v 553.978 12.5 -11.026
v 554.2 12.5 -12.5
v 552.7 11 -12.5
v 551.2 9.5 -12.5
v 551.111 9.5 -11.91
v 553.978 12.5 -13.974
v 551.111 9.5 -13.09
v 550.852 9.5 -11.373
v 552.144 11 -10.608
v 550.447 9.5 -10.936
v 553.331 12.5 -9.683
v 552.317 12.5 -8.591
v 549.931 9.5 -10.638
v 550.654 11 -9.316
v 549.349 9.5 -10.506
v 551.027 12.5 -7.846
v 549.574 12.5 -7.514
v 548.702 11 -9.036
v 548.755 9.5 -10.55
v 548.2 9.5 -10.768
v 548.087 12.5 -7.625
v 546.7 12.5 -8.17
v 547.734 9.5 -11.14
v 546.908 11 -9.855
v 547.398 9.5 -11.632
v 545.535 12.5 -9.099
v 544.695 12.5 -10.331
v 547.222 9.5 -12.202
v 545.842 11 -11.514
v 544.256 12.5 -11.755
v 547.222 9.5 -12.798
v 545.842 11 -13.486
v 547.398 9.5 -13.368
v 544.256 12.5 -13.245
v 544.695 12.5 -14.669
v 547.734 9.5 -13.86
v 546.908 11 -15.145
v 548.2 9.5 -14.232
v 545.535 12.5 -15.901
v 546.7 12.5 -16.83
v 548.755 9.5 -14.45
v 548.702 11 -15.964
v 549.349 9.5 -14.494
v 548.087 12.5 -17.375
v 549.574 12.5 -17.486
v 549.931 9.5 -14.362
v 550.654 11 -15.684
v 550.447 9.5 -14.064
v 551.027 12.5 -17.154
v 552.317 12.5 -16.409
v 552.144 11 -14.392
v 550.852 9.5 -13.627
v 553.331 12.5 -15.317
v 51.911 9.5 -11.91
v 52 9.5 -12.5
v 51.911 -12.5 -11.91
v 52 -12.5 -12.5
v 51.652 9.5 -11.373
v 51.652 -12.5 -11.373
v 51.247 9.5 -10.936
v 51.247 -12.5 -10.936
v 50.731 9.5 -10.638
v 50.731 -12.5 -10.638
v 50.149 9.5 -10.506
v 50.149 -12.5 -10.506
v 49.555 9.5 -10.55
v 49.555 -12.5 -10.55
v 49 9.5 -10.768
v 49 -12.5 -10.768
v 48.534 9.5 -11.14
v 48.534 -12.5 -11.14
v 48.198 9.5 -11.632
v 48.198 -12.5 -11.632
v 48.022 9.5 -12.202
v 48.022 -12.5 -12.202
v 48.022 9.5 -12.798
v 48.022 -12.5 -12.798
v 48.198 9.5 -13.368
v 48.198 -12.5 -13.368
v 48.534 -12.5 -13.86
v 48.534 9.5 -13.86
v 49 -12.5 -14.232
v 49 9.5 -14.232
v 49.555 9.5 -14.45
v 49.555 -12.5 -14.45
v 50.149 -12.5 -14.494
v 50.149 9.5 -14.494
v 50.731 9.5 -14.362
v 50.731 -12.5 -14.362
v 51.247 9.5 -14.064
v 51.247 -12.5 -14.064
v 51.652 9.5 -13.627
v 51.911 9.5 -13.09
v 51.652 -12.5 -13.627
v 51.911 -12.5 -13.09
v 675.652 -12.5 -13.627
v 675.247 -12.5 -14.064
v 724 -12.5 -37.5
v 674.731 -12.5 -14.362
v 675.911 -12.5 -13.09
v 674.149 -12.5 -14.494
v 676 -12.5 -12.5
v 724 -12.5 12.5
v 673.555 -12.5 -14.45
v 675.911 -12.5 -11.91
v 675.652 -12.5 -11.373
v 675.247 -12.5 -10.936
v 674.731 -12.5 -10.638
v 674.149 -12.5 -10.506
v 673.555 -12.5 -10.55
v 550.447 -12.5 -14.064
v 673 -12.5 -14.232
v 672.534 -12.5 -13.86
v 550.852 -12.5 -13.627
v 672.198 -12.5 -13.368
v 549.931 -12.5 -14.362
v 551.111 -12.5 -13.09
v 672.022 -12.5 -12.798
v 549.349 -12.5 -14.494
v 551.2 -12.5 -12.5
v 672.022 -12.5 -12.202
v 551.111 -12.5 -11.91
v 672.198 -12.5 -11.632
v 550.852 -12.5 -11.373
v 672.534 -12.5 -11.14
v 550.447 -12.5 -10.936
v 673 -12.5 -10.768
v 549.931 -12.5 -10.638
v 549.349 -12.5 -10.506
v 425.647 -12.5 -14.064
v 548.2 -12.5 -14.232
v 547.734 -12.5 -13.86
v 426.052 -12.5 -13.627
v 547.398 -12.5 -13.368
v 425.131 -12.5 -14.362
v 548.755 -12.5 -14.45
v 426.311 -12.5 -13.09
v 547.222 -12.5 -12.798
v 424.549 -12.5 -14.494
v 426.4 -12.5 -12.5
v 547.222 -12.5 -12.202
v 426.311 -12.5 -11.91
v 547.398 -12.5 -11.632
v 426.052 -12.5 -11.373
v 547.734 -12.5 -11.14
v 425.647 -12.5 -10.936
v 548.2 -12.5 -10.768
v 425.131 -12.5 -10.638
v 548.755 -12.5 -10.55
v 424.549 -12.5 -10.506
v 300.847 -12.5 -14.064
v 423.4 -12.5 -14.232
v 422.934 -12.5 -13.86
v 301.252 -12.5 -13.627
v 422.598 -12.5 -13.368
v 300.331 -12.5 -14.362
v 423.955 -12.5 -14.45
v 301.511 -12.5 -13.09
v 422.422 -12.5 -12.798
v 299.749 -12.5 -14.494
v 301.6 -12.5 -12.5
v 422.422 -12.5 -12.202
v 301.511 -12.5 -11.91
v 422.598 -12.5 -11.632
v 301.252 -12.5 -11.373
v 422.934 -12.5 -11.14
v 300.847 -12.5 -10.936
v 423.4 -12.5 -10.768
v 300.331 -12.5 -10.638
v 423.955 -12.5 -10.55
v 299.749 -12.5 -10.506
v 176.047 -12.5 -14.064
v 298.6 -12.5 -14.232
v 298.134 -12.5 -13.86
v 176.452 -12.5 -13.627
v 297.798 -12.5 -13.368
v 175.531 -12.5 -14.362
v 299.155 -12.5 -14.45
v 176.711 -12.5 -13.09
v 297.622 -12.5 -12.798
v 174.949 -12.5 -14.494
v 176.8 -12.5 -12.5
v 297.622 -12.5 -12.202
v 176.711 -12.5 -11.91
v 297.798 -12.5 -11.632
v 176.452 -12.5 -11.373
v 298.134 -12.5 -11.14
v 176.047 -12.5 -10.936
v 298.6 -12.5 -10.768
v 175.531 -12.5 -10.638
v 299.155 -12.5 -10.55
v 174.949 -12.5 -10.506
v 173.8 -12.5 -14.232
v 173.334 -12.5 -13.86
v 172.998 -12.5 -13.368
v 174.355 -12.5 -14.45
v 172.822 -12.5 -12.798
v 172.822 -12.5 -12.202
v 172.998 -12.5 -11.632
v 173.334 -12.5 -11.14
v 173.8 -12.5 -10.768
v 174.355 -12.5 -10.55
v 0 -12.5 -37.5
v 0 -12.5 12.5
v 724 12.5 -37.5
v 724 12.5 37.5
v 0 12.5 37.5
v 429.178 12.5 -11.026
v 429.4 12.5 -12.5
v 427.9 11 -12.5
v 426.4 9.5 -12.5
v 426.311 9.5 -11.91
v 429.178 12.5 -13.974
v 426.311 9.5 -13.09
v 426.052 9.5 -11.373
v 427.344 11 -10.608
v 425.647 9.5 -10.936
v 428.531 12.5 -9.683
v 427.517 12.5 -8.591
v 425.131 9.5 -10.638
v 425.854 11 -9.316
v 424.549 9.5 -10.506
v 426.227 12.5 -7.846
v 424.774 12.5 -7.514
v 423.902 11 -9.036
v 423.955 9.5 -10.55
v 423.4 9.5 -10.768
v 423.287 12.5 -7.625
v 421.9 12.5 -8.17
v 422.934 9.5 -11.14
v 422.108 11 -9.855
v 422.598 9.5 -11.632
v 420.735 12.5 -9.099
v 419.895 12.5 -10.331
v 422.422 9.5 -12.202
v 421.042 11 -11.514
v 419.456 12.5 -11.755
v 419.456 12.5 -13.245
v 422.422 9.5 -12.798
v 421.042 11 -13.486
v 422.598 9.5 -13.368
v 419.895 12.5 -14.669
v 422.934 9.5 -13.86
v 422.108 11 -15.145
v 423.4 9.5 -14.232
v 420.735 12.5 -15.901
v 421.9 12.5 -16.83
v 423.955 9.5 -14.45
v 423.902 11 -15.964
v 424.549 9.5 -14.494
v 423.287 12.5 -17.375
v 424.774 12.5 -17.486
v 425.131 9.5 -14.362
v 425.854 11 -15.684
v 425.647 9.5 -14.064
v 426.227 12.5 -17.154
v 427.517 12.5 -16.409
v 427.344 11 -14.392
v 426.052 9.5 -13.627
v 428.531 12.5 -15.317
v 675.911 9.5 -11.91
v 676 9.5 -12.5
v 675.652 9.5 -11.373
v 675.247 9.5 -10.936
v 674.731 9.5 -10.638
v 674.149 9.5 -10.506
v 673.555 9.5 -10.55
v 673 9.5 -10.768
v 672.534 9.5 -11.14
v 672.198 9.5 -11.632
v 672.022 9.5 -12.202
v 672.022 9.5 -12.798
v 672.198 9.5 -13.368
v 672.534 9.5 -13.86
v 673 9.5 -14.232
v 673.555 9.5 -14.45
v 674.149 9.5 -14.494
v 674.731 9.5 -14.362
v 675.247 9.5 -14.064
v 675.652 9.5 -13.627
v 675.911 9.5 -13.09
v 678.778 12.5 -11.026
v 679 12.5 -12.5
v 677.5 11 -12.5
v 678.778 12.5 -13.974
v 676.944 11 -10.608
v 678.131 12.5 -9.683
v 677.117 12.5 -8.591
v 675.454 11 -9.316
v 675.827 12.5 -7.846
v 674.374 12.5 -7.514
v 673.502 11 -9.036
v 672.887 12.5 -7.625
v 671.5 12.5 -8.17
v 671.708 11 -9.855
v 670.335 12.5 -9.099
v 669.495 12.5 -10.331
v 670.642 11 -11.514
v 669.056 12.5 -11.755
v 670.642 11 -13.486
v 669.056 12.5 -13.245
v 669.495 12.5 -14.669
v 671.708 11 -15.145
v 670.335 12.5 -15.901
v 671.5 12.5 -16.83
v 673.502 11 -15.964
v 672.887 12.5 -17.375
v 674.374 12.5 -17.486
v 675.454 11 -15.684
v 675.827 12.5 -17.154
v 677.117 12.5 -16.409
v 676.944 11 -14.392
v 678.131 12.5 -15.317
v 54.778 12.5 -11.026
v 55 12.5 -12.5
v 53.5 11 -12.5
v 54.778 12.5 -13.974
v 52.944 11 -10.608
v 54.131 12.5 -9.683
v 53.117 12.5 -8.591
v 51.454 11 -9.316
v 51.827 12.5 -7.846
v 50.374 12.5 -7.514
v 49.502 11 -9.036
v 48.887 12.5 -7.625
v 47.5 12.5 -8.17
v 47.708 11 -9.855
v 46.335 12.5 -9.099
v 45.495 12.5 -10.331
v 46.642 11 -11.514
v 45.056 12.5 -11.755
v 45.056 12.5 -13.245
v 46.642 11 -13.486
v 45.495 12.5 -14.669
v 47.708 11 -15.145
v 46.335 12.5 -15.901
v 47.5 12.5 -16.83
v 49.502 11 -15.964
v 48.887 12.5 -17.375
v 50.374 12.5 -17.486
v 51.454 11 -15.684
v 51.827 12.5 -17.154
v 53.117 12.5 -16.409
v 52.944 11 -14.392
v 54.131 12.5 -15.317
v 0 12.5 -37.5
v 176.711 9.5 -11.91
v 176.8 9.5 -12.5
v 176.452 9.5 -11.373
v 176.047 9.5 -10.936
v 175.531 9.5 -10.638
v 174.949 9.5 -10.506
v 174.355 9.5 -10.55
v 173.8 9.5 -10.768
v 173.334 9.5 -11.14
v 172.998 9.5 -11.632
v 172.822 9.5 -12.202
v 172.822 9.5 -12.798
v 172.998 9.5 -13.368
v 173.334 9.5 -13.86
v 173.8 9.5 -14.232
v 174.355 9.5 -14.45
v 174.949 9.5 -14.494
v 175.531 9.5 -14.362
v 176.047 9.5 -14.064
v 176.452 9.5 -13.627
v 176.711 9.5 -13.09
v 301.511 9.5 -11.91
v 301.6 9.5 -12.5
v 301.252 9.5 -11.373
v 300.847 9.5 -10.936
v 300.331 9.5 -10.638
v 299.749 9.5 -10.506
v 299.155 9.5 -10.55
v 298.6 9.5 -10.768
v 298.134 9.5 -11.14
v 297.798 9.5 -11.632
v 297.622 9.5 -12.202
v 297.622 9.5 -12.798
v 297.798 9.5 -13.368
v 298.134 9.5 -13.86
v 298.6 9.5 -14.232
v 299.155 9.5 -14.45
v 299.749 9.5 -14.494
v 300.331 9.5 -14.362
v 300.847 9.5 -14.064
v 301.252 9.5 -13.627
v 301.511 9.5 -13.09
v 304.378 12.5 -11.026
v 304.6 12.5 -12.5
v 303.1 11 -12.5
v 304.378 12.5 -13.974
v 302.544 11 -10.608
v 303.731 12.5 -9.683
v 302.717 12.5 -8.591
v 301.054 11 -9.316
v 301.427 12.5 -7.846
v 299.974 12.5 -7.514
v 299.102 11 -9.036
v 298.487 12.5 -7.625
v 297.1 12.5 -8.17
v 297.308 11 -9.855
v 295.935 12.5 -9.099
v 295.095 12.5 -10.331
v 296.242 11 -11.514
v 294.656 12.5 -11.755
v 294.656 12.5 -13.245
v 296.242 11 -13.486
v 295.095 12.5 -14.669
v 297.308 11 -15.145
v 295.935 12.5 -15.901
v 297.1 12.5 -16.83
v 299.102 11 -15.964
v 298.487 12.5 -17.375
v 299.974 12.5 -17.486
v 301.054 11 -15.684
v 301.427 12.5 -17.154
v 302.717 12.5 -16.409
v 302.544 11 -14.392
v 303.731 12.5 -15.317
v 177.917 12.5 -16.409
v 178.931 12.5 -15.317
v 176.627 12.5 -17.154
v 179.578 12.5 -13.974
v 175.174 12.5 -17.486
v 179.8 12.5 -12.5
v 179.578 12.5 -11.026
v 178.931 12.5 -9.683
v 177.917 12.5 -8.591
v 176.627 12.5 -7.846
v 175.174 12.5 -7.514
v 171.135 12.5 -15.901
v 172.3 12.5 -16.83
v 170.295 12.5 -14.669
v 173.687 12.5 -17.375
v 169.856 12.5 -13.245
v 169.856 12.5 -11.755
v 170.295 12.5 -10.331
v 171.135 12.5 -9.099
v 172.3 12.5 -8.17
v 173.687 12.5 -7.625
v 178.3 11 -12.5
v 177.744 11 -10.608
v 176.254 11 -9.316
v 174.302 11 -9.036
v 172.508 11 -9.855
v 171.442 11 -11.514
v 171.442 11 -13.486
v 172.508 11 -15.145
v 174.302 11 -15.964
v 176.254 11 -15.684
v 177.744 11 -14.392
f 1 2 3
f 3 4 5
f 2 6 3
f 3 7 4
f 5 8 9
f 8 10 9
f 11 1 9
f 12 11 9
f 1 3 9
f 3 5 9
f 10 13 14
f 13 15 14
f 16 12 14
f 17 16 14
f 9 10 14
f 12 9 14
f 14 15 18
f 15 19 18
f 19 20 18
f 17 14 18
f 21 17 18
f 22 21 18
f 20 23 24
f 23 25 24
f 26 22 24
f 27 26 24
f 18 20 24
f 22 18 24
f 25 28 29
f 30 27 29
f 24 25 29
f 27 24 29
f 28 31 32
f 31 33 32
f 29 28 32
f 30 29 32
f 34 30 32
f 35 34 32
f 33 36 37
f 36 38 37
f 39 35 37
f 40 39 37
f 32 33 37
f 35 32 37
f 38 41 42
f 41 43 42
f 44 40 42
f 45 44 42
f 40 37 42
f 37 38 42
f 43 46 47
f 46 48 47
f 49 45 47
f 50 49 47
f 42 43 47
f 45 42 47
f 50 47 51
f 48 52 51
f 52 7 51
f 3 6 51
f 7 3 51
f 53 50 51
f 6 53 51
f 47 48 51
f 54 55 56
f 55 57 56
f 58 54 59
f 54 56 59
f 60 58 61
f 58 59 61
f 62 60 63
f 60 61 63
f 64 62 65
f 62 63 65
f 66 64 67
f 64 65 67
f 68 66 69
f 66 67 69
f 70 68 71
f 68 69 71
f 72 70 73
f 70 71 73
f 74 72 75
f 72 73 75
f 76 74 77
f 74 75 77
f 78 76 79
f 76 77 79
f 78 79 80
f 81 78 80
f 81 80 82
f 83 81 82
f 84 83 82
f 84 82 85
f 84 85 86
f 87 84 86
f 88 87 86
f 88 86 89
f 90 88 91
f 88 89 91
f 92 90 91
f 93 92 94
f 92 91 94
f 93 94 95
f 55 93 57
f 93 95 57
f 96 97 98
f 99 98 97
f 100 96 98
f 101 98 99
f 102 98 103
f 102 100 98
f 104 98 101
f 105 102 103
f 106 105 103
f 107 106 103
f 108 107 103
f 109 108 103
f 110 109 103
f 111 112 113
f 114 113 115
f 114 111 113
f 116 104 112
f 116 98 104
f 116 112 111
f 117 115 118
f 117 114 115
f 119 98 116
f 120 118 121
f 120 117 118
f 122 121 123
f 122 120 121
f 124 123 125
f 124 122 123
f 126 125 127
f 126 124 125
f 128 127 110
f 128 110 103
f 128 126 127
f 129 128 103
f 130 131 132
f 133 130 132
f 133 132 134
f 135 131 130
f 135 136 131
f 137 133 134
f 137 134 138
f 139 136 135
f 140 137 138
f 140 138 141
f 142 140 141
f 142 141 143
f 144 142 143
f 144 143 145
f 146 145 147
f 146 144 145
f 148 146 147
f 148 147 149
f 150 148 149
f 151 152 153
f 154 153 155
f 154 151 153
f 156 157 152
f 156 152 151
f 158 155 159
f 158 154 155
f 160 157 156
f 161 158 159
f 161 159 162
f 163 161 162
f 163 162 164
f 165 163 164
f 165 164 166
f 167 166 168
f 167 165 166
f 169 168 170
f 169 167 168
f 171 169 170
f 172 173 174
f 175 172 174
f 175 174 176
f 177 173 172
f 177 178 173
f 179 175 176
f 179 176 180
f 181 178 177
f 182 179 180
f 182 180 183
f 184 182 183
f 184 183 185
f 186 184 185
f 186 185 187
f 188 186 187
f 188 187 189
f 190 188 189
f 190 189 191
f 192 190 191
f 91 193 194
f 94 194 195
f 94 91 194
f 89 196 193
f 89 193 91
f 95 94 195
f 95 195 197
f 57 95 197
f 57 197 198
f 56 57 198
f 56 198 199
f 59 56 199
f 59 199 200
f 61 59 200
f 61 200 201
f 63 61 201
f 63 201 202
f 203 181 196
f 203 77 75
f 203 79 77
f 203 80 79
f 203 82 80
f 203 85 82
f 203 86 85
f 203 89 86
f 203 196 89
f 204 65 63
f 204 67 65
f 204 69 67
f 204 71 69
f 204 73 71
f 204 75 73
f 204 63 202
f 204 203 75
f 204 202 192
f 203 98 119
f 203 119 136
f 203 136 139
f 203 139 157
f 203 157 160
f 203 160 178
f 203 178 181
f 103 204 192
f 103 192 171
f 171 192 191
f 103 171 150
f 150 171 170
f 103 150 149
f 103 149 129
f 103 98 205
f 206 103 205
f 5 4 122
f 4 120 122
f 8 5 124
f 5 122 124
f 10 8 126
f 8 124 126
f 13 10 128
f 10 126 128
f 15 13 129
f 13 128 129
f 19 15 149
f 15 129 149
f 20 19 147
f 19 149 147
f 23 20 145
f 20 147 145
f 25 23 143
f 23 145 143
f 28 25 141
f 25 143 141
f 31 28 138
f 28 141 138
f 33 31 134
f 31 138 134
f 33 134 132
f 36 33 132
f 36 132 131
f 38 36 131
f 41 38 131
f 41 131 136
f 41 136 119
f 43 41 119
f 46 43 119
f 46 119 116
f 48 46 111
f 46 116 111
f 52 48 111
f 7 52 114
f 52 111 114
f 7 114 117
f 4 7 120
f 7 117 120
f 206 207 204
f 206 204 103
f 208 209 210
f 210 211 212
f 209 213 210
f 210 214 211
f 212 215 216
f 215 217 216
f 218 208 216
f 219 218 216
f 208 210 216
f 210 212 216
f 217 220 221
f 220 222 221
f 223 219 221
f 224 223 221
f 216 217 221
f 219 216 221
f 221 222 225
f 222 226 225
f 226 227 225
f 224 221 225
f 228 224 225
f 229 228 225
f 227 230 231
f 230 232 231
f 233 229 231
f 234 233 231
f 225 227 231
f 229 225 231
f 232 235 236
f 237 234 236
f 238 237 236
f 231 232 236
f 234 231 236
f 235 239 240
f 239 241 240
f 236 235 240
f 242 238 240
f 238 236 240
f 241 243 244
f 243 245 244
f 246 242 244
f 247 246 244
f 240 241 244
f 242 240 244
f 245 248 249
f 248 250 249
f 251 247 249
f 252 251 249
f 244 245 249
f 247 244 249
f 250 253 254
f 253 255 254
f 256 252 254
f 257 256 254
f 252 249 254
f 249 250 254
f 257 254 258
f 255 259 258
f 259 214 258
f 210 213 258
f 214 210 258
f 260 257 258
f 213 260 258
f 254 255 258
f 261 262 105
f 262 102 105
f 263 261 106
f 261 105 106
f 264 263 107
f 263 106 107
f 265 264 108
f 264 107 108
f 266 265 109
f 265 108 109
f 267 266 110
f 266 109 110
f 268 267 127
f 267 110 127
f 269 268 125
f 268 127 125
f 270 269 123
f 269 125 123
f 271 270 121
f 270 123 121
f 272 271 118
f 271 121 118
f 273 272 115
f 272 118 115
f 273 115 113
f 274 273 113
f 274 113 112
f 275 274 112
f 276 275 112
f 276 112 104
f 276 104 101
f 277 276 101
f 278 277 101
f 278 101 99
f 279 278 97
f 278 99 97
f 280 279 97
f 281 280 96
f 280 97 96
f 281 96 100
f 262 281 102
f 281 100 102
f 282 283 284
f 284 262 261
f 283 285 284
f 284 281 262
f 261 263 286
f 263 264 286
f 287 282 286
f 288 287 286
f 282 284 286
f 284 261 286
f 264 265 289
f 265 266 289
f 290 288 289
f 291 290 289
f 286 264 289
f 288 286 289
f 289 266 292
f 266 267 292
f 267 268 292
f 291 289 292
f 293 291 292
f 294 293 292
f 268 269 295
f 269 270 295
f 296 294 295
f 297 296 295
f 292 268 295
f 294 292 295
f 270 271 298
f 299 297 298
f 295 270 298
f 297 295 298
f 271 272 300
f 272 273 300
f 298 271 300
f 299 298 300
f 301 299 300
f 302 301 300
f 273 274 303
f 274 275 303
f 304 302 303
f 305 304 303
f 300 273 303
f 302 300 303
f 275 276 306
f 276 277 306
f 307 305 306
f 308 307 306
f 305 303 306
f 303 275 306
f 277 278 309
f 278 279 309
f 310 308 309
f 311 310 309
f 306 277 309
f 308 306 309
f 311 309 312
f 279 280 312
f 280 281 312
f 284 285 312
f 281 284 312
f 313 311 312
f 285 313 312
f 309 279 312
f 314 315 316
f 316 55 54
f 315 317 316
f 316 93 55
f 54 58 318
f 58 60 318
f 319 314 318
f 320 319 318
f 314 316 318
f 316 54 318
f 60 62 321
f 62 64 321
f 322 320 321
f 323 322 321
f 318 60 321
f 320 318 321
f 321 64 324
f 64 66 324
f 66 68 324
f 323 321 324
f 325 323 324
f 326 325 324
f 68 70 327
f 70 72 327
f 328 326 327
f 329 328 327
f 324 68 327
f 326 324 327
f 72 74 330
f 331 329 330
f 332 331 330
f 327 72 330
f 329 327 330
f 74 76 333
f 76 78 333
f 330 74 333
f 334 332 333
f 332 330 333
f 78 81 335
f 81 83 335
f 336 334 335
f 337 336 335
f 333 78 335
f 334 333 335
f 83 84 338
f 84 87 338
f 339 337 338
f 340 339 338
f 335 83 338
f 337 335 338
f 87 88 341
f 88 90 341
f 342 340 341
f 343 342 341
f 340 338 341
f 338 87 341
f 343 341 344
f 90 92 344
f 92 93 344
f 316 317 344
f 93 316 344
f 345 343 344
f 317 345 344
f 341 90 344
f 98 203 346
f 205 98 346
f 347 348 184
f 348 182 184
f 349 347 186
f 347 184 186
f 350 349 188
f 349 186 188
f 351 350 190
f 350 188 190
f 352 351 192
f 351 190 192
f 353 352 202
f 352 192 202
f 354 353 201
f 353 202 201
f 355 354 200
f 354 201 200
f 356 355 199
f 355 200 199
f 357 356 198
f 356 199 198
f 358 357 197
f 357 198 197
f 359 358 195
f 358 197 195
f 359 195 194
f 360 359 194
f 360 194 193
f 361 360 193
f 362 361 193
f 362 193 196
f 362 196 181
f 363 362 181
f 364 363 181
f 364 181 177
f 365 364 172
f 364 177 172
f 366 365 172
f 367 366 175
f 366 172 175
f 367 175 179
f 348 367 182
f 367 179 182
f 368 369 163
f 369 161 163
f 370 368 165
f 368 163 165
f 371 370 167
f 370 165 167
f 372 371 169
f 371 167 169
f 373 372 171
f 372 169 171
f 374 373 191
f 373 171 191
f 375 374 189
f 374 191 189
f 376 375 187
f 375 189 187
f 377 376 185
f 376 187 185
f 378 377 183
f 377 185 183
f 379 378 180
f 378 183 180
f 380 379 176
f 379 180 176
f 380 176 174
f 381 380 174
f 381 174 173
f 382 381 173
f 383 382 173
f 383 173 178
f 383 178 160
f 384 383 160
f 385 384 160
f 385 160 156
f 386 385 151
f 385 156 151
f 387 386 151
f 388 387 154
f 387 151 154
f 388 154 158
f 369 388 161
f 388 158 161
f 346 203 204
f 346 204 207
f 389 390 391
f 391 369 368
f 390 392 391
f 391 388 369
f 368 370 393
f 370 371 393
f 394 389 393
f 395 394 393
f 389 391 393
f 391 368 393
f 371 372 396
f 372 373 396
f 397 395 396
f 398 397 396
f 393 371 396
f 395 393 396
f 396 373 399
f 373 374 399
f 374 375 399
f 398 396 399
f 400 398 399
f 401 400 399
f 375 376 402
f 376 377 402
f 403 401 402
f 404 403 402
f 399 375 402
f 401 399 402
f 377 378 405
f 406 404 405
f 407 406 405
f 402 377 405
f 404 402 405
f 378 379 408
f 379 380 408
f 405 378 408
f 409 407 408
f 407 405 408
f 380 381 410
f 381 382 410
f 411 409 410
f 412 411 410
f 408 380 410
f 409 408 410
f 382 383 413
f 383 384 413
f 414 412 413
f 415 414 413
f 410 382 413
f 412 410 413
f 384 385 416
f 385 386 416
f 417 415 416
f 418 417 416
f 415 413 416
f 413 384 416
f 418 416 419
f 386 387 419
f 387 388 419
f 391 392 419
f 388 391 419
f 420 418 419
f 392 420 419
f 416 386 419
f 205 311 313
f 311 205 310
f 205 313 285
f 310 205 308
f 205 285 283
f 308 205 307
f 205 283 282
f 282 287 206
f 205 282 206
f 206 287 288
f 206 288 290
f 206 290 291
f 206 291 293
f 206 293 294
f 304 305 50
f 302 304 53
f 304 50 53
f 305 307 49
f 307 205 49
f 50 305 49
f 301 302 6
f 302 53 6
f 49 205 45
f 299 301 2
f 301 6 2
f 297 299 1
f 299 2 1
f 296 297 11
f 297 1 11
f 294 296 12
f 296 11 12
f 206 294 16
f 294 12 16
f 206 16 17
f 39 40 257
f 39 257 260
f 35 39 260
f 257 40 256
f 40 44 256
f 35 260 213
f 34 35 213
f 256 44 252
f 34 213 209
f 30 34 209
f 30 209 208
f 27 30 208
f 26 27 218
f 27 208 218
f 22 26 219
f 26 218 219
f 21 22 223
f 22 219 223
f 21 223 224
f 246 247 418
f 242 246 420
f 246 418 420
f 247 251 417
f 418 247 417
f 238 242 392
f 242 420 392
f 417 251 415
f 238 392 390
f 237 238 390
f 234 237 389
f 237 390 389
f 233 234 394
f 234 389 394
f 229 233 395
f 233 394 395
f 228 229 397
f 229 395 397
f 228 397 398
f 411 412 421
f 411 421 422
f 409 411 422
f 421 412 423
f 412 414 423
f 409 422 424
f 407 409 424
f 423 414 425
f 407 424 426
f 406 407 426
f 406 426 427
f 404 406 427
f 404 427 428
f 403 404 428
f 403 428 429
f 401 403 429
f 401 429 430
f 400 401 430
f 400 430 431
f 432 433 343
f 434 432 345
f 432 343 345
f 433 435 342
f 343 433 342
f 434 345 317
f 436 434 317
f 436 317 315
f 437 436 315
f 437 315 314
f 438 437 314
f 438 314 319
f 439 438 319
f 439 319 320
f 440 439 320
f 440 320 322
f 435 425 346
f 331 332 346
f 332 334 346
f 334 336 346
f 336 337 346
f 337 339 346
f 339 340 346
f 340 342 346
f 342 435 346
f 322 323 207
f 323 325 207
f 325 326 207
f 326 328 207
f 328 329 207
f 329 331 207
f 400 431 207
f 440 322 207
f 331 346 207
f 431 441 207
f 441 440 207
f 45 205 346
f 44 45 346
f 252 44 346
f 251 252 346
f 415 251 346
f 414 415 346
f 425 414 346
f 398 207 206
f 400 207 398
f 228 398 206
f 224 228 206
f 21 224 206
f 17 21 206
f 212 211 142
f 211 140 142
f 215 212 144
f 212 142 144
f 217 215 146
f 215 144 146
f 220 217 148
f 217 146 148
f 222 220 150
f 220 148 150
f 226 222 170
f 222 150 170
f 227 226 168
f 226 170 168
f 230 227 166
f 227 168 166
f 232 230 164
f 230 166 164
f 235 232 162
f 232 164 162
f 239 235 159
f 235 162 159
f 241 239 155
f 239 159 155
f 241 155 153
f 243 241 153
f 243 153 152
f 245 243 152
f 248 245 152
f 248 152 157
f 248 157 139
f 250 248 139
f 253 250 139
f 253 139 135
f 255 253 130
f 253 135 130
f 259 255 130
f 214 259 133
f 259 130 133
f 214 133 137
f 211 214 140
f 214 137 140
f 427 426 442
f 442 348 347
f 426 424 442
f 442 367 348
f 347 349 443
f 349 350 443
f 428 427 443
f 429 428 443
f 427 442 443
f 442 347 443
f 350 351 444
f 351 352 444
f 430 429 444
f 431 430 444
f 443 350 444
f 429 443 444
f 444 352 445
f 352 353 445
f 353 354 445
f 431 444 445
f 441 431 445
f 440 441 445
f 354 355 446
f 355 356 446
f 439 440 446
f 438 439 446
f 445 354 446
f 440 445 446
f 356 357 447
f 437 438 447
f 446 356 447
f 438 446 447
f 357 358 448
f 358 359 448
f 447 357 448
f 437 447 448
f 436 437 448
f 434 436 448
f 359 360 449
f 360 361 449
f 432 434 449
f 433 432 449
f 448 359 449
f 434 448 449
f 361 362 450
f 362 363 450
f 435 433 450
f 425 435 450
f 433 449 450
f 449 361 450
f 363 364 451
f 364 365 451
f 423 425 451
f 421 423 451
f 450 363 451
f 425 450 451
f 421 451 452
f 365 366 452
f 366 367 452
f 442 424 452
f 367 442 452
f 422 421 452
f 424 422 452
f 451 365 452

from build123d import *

# Parameters (mm, degrees)
F4_W           = 25
F4_H           = 75
F0_DEPTH       = 724
F1_SIZE        = 24.99999
F3_D           = 4
F3_CSINK_D     = 10
F3_CSINK_ANGLE = 90


# Not quite as in the source:
# - a fillet or chamfer is up to 0.001 mm smaller than in the source, because OpenCascade refuses the exact size
# - a feature names something its author has since deleted; it is built from what else it names


with BuildPart() as f0:
    # F4 (on Right) → F0 (new body)
    with BuildSketch(Plane.YZ):
        Rectangle(F4_W, F4_H)
    extrude(amount=F0_DEPTH)

    # F1 (size 25 in the source; OpenCascade refuses exactly that, so slightly less here)
    f1_edges = [f0.edges().sort_by_distance(p)[0] for p in [
        (362, -12.5, 37.5),
    ]]
    chamfer(f1_edges, length=F1_SIZE)

    # F3 (through all)
    with Locations(Plane(origin=(0, 12.5, 0), x_dir=(-1, 0, 0), z_dir=(0, 1, 0))):
        with Locations((-50, -12.5), (-174.8, -12.5), (-299.6, -12.5), (-424.4, -12.5), (-549.2, -12.5), (-674, -12.5)):
            CounterSinkHole(F3_D / 2, F3_CSINK_D / 2, counter_sink_angle=F3_CSINK_ANGLE)


solid = f0.part
